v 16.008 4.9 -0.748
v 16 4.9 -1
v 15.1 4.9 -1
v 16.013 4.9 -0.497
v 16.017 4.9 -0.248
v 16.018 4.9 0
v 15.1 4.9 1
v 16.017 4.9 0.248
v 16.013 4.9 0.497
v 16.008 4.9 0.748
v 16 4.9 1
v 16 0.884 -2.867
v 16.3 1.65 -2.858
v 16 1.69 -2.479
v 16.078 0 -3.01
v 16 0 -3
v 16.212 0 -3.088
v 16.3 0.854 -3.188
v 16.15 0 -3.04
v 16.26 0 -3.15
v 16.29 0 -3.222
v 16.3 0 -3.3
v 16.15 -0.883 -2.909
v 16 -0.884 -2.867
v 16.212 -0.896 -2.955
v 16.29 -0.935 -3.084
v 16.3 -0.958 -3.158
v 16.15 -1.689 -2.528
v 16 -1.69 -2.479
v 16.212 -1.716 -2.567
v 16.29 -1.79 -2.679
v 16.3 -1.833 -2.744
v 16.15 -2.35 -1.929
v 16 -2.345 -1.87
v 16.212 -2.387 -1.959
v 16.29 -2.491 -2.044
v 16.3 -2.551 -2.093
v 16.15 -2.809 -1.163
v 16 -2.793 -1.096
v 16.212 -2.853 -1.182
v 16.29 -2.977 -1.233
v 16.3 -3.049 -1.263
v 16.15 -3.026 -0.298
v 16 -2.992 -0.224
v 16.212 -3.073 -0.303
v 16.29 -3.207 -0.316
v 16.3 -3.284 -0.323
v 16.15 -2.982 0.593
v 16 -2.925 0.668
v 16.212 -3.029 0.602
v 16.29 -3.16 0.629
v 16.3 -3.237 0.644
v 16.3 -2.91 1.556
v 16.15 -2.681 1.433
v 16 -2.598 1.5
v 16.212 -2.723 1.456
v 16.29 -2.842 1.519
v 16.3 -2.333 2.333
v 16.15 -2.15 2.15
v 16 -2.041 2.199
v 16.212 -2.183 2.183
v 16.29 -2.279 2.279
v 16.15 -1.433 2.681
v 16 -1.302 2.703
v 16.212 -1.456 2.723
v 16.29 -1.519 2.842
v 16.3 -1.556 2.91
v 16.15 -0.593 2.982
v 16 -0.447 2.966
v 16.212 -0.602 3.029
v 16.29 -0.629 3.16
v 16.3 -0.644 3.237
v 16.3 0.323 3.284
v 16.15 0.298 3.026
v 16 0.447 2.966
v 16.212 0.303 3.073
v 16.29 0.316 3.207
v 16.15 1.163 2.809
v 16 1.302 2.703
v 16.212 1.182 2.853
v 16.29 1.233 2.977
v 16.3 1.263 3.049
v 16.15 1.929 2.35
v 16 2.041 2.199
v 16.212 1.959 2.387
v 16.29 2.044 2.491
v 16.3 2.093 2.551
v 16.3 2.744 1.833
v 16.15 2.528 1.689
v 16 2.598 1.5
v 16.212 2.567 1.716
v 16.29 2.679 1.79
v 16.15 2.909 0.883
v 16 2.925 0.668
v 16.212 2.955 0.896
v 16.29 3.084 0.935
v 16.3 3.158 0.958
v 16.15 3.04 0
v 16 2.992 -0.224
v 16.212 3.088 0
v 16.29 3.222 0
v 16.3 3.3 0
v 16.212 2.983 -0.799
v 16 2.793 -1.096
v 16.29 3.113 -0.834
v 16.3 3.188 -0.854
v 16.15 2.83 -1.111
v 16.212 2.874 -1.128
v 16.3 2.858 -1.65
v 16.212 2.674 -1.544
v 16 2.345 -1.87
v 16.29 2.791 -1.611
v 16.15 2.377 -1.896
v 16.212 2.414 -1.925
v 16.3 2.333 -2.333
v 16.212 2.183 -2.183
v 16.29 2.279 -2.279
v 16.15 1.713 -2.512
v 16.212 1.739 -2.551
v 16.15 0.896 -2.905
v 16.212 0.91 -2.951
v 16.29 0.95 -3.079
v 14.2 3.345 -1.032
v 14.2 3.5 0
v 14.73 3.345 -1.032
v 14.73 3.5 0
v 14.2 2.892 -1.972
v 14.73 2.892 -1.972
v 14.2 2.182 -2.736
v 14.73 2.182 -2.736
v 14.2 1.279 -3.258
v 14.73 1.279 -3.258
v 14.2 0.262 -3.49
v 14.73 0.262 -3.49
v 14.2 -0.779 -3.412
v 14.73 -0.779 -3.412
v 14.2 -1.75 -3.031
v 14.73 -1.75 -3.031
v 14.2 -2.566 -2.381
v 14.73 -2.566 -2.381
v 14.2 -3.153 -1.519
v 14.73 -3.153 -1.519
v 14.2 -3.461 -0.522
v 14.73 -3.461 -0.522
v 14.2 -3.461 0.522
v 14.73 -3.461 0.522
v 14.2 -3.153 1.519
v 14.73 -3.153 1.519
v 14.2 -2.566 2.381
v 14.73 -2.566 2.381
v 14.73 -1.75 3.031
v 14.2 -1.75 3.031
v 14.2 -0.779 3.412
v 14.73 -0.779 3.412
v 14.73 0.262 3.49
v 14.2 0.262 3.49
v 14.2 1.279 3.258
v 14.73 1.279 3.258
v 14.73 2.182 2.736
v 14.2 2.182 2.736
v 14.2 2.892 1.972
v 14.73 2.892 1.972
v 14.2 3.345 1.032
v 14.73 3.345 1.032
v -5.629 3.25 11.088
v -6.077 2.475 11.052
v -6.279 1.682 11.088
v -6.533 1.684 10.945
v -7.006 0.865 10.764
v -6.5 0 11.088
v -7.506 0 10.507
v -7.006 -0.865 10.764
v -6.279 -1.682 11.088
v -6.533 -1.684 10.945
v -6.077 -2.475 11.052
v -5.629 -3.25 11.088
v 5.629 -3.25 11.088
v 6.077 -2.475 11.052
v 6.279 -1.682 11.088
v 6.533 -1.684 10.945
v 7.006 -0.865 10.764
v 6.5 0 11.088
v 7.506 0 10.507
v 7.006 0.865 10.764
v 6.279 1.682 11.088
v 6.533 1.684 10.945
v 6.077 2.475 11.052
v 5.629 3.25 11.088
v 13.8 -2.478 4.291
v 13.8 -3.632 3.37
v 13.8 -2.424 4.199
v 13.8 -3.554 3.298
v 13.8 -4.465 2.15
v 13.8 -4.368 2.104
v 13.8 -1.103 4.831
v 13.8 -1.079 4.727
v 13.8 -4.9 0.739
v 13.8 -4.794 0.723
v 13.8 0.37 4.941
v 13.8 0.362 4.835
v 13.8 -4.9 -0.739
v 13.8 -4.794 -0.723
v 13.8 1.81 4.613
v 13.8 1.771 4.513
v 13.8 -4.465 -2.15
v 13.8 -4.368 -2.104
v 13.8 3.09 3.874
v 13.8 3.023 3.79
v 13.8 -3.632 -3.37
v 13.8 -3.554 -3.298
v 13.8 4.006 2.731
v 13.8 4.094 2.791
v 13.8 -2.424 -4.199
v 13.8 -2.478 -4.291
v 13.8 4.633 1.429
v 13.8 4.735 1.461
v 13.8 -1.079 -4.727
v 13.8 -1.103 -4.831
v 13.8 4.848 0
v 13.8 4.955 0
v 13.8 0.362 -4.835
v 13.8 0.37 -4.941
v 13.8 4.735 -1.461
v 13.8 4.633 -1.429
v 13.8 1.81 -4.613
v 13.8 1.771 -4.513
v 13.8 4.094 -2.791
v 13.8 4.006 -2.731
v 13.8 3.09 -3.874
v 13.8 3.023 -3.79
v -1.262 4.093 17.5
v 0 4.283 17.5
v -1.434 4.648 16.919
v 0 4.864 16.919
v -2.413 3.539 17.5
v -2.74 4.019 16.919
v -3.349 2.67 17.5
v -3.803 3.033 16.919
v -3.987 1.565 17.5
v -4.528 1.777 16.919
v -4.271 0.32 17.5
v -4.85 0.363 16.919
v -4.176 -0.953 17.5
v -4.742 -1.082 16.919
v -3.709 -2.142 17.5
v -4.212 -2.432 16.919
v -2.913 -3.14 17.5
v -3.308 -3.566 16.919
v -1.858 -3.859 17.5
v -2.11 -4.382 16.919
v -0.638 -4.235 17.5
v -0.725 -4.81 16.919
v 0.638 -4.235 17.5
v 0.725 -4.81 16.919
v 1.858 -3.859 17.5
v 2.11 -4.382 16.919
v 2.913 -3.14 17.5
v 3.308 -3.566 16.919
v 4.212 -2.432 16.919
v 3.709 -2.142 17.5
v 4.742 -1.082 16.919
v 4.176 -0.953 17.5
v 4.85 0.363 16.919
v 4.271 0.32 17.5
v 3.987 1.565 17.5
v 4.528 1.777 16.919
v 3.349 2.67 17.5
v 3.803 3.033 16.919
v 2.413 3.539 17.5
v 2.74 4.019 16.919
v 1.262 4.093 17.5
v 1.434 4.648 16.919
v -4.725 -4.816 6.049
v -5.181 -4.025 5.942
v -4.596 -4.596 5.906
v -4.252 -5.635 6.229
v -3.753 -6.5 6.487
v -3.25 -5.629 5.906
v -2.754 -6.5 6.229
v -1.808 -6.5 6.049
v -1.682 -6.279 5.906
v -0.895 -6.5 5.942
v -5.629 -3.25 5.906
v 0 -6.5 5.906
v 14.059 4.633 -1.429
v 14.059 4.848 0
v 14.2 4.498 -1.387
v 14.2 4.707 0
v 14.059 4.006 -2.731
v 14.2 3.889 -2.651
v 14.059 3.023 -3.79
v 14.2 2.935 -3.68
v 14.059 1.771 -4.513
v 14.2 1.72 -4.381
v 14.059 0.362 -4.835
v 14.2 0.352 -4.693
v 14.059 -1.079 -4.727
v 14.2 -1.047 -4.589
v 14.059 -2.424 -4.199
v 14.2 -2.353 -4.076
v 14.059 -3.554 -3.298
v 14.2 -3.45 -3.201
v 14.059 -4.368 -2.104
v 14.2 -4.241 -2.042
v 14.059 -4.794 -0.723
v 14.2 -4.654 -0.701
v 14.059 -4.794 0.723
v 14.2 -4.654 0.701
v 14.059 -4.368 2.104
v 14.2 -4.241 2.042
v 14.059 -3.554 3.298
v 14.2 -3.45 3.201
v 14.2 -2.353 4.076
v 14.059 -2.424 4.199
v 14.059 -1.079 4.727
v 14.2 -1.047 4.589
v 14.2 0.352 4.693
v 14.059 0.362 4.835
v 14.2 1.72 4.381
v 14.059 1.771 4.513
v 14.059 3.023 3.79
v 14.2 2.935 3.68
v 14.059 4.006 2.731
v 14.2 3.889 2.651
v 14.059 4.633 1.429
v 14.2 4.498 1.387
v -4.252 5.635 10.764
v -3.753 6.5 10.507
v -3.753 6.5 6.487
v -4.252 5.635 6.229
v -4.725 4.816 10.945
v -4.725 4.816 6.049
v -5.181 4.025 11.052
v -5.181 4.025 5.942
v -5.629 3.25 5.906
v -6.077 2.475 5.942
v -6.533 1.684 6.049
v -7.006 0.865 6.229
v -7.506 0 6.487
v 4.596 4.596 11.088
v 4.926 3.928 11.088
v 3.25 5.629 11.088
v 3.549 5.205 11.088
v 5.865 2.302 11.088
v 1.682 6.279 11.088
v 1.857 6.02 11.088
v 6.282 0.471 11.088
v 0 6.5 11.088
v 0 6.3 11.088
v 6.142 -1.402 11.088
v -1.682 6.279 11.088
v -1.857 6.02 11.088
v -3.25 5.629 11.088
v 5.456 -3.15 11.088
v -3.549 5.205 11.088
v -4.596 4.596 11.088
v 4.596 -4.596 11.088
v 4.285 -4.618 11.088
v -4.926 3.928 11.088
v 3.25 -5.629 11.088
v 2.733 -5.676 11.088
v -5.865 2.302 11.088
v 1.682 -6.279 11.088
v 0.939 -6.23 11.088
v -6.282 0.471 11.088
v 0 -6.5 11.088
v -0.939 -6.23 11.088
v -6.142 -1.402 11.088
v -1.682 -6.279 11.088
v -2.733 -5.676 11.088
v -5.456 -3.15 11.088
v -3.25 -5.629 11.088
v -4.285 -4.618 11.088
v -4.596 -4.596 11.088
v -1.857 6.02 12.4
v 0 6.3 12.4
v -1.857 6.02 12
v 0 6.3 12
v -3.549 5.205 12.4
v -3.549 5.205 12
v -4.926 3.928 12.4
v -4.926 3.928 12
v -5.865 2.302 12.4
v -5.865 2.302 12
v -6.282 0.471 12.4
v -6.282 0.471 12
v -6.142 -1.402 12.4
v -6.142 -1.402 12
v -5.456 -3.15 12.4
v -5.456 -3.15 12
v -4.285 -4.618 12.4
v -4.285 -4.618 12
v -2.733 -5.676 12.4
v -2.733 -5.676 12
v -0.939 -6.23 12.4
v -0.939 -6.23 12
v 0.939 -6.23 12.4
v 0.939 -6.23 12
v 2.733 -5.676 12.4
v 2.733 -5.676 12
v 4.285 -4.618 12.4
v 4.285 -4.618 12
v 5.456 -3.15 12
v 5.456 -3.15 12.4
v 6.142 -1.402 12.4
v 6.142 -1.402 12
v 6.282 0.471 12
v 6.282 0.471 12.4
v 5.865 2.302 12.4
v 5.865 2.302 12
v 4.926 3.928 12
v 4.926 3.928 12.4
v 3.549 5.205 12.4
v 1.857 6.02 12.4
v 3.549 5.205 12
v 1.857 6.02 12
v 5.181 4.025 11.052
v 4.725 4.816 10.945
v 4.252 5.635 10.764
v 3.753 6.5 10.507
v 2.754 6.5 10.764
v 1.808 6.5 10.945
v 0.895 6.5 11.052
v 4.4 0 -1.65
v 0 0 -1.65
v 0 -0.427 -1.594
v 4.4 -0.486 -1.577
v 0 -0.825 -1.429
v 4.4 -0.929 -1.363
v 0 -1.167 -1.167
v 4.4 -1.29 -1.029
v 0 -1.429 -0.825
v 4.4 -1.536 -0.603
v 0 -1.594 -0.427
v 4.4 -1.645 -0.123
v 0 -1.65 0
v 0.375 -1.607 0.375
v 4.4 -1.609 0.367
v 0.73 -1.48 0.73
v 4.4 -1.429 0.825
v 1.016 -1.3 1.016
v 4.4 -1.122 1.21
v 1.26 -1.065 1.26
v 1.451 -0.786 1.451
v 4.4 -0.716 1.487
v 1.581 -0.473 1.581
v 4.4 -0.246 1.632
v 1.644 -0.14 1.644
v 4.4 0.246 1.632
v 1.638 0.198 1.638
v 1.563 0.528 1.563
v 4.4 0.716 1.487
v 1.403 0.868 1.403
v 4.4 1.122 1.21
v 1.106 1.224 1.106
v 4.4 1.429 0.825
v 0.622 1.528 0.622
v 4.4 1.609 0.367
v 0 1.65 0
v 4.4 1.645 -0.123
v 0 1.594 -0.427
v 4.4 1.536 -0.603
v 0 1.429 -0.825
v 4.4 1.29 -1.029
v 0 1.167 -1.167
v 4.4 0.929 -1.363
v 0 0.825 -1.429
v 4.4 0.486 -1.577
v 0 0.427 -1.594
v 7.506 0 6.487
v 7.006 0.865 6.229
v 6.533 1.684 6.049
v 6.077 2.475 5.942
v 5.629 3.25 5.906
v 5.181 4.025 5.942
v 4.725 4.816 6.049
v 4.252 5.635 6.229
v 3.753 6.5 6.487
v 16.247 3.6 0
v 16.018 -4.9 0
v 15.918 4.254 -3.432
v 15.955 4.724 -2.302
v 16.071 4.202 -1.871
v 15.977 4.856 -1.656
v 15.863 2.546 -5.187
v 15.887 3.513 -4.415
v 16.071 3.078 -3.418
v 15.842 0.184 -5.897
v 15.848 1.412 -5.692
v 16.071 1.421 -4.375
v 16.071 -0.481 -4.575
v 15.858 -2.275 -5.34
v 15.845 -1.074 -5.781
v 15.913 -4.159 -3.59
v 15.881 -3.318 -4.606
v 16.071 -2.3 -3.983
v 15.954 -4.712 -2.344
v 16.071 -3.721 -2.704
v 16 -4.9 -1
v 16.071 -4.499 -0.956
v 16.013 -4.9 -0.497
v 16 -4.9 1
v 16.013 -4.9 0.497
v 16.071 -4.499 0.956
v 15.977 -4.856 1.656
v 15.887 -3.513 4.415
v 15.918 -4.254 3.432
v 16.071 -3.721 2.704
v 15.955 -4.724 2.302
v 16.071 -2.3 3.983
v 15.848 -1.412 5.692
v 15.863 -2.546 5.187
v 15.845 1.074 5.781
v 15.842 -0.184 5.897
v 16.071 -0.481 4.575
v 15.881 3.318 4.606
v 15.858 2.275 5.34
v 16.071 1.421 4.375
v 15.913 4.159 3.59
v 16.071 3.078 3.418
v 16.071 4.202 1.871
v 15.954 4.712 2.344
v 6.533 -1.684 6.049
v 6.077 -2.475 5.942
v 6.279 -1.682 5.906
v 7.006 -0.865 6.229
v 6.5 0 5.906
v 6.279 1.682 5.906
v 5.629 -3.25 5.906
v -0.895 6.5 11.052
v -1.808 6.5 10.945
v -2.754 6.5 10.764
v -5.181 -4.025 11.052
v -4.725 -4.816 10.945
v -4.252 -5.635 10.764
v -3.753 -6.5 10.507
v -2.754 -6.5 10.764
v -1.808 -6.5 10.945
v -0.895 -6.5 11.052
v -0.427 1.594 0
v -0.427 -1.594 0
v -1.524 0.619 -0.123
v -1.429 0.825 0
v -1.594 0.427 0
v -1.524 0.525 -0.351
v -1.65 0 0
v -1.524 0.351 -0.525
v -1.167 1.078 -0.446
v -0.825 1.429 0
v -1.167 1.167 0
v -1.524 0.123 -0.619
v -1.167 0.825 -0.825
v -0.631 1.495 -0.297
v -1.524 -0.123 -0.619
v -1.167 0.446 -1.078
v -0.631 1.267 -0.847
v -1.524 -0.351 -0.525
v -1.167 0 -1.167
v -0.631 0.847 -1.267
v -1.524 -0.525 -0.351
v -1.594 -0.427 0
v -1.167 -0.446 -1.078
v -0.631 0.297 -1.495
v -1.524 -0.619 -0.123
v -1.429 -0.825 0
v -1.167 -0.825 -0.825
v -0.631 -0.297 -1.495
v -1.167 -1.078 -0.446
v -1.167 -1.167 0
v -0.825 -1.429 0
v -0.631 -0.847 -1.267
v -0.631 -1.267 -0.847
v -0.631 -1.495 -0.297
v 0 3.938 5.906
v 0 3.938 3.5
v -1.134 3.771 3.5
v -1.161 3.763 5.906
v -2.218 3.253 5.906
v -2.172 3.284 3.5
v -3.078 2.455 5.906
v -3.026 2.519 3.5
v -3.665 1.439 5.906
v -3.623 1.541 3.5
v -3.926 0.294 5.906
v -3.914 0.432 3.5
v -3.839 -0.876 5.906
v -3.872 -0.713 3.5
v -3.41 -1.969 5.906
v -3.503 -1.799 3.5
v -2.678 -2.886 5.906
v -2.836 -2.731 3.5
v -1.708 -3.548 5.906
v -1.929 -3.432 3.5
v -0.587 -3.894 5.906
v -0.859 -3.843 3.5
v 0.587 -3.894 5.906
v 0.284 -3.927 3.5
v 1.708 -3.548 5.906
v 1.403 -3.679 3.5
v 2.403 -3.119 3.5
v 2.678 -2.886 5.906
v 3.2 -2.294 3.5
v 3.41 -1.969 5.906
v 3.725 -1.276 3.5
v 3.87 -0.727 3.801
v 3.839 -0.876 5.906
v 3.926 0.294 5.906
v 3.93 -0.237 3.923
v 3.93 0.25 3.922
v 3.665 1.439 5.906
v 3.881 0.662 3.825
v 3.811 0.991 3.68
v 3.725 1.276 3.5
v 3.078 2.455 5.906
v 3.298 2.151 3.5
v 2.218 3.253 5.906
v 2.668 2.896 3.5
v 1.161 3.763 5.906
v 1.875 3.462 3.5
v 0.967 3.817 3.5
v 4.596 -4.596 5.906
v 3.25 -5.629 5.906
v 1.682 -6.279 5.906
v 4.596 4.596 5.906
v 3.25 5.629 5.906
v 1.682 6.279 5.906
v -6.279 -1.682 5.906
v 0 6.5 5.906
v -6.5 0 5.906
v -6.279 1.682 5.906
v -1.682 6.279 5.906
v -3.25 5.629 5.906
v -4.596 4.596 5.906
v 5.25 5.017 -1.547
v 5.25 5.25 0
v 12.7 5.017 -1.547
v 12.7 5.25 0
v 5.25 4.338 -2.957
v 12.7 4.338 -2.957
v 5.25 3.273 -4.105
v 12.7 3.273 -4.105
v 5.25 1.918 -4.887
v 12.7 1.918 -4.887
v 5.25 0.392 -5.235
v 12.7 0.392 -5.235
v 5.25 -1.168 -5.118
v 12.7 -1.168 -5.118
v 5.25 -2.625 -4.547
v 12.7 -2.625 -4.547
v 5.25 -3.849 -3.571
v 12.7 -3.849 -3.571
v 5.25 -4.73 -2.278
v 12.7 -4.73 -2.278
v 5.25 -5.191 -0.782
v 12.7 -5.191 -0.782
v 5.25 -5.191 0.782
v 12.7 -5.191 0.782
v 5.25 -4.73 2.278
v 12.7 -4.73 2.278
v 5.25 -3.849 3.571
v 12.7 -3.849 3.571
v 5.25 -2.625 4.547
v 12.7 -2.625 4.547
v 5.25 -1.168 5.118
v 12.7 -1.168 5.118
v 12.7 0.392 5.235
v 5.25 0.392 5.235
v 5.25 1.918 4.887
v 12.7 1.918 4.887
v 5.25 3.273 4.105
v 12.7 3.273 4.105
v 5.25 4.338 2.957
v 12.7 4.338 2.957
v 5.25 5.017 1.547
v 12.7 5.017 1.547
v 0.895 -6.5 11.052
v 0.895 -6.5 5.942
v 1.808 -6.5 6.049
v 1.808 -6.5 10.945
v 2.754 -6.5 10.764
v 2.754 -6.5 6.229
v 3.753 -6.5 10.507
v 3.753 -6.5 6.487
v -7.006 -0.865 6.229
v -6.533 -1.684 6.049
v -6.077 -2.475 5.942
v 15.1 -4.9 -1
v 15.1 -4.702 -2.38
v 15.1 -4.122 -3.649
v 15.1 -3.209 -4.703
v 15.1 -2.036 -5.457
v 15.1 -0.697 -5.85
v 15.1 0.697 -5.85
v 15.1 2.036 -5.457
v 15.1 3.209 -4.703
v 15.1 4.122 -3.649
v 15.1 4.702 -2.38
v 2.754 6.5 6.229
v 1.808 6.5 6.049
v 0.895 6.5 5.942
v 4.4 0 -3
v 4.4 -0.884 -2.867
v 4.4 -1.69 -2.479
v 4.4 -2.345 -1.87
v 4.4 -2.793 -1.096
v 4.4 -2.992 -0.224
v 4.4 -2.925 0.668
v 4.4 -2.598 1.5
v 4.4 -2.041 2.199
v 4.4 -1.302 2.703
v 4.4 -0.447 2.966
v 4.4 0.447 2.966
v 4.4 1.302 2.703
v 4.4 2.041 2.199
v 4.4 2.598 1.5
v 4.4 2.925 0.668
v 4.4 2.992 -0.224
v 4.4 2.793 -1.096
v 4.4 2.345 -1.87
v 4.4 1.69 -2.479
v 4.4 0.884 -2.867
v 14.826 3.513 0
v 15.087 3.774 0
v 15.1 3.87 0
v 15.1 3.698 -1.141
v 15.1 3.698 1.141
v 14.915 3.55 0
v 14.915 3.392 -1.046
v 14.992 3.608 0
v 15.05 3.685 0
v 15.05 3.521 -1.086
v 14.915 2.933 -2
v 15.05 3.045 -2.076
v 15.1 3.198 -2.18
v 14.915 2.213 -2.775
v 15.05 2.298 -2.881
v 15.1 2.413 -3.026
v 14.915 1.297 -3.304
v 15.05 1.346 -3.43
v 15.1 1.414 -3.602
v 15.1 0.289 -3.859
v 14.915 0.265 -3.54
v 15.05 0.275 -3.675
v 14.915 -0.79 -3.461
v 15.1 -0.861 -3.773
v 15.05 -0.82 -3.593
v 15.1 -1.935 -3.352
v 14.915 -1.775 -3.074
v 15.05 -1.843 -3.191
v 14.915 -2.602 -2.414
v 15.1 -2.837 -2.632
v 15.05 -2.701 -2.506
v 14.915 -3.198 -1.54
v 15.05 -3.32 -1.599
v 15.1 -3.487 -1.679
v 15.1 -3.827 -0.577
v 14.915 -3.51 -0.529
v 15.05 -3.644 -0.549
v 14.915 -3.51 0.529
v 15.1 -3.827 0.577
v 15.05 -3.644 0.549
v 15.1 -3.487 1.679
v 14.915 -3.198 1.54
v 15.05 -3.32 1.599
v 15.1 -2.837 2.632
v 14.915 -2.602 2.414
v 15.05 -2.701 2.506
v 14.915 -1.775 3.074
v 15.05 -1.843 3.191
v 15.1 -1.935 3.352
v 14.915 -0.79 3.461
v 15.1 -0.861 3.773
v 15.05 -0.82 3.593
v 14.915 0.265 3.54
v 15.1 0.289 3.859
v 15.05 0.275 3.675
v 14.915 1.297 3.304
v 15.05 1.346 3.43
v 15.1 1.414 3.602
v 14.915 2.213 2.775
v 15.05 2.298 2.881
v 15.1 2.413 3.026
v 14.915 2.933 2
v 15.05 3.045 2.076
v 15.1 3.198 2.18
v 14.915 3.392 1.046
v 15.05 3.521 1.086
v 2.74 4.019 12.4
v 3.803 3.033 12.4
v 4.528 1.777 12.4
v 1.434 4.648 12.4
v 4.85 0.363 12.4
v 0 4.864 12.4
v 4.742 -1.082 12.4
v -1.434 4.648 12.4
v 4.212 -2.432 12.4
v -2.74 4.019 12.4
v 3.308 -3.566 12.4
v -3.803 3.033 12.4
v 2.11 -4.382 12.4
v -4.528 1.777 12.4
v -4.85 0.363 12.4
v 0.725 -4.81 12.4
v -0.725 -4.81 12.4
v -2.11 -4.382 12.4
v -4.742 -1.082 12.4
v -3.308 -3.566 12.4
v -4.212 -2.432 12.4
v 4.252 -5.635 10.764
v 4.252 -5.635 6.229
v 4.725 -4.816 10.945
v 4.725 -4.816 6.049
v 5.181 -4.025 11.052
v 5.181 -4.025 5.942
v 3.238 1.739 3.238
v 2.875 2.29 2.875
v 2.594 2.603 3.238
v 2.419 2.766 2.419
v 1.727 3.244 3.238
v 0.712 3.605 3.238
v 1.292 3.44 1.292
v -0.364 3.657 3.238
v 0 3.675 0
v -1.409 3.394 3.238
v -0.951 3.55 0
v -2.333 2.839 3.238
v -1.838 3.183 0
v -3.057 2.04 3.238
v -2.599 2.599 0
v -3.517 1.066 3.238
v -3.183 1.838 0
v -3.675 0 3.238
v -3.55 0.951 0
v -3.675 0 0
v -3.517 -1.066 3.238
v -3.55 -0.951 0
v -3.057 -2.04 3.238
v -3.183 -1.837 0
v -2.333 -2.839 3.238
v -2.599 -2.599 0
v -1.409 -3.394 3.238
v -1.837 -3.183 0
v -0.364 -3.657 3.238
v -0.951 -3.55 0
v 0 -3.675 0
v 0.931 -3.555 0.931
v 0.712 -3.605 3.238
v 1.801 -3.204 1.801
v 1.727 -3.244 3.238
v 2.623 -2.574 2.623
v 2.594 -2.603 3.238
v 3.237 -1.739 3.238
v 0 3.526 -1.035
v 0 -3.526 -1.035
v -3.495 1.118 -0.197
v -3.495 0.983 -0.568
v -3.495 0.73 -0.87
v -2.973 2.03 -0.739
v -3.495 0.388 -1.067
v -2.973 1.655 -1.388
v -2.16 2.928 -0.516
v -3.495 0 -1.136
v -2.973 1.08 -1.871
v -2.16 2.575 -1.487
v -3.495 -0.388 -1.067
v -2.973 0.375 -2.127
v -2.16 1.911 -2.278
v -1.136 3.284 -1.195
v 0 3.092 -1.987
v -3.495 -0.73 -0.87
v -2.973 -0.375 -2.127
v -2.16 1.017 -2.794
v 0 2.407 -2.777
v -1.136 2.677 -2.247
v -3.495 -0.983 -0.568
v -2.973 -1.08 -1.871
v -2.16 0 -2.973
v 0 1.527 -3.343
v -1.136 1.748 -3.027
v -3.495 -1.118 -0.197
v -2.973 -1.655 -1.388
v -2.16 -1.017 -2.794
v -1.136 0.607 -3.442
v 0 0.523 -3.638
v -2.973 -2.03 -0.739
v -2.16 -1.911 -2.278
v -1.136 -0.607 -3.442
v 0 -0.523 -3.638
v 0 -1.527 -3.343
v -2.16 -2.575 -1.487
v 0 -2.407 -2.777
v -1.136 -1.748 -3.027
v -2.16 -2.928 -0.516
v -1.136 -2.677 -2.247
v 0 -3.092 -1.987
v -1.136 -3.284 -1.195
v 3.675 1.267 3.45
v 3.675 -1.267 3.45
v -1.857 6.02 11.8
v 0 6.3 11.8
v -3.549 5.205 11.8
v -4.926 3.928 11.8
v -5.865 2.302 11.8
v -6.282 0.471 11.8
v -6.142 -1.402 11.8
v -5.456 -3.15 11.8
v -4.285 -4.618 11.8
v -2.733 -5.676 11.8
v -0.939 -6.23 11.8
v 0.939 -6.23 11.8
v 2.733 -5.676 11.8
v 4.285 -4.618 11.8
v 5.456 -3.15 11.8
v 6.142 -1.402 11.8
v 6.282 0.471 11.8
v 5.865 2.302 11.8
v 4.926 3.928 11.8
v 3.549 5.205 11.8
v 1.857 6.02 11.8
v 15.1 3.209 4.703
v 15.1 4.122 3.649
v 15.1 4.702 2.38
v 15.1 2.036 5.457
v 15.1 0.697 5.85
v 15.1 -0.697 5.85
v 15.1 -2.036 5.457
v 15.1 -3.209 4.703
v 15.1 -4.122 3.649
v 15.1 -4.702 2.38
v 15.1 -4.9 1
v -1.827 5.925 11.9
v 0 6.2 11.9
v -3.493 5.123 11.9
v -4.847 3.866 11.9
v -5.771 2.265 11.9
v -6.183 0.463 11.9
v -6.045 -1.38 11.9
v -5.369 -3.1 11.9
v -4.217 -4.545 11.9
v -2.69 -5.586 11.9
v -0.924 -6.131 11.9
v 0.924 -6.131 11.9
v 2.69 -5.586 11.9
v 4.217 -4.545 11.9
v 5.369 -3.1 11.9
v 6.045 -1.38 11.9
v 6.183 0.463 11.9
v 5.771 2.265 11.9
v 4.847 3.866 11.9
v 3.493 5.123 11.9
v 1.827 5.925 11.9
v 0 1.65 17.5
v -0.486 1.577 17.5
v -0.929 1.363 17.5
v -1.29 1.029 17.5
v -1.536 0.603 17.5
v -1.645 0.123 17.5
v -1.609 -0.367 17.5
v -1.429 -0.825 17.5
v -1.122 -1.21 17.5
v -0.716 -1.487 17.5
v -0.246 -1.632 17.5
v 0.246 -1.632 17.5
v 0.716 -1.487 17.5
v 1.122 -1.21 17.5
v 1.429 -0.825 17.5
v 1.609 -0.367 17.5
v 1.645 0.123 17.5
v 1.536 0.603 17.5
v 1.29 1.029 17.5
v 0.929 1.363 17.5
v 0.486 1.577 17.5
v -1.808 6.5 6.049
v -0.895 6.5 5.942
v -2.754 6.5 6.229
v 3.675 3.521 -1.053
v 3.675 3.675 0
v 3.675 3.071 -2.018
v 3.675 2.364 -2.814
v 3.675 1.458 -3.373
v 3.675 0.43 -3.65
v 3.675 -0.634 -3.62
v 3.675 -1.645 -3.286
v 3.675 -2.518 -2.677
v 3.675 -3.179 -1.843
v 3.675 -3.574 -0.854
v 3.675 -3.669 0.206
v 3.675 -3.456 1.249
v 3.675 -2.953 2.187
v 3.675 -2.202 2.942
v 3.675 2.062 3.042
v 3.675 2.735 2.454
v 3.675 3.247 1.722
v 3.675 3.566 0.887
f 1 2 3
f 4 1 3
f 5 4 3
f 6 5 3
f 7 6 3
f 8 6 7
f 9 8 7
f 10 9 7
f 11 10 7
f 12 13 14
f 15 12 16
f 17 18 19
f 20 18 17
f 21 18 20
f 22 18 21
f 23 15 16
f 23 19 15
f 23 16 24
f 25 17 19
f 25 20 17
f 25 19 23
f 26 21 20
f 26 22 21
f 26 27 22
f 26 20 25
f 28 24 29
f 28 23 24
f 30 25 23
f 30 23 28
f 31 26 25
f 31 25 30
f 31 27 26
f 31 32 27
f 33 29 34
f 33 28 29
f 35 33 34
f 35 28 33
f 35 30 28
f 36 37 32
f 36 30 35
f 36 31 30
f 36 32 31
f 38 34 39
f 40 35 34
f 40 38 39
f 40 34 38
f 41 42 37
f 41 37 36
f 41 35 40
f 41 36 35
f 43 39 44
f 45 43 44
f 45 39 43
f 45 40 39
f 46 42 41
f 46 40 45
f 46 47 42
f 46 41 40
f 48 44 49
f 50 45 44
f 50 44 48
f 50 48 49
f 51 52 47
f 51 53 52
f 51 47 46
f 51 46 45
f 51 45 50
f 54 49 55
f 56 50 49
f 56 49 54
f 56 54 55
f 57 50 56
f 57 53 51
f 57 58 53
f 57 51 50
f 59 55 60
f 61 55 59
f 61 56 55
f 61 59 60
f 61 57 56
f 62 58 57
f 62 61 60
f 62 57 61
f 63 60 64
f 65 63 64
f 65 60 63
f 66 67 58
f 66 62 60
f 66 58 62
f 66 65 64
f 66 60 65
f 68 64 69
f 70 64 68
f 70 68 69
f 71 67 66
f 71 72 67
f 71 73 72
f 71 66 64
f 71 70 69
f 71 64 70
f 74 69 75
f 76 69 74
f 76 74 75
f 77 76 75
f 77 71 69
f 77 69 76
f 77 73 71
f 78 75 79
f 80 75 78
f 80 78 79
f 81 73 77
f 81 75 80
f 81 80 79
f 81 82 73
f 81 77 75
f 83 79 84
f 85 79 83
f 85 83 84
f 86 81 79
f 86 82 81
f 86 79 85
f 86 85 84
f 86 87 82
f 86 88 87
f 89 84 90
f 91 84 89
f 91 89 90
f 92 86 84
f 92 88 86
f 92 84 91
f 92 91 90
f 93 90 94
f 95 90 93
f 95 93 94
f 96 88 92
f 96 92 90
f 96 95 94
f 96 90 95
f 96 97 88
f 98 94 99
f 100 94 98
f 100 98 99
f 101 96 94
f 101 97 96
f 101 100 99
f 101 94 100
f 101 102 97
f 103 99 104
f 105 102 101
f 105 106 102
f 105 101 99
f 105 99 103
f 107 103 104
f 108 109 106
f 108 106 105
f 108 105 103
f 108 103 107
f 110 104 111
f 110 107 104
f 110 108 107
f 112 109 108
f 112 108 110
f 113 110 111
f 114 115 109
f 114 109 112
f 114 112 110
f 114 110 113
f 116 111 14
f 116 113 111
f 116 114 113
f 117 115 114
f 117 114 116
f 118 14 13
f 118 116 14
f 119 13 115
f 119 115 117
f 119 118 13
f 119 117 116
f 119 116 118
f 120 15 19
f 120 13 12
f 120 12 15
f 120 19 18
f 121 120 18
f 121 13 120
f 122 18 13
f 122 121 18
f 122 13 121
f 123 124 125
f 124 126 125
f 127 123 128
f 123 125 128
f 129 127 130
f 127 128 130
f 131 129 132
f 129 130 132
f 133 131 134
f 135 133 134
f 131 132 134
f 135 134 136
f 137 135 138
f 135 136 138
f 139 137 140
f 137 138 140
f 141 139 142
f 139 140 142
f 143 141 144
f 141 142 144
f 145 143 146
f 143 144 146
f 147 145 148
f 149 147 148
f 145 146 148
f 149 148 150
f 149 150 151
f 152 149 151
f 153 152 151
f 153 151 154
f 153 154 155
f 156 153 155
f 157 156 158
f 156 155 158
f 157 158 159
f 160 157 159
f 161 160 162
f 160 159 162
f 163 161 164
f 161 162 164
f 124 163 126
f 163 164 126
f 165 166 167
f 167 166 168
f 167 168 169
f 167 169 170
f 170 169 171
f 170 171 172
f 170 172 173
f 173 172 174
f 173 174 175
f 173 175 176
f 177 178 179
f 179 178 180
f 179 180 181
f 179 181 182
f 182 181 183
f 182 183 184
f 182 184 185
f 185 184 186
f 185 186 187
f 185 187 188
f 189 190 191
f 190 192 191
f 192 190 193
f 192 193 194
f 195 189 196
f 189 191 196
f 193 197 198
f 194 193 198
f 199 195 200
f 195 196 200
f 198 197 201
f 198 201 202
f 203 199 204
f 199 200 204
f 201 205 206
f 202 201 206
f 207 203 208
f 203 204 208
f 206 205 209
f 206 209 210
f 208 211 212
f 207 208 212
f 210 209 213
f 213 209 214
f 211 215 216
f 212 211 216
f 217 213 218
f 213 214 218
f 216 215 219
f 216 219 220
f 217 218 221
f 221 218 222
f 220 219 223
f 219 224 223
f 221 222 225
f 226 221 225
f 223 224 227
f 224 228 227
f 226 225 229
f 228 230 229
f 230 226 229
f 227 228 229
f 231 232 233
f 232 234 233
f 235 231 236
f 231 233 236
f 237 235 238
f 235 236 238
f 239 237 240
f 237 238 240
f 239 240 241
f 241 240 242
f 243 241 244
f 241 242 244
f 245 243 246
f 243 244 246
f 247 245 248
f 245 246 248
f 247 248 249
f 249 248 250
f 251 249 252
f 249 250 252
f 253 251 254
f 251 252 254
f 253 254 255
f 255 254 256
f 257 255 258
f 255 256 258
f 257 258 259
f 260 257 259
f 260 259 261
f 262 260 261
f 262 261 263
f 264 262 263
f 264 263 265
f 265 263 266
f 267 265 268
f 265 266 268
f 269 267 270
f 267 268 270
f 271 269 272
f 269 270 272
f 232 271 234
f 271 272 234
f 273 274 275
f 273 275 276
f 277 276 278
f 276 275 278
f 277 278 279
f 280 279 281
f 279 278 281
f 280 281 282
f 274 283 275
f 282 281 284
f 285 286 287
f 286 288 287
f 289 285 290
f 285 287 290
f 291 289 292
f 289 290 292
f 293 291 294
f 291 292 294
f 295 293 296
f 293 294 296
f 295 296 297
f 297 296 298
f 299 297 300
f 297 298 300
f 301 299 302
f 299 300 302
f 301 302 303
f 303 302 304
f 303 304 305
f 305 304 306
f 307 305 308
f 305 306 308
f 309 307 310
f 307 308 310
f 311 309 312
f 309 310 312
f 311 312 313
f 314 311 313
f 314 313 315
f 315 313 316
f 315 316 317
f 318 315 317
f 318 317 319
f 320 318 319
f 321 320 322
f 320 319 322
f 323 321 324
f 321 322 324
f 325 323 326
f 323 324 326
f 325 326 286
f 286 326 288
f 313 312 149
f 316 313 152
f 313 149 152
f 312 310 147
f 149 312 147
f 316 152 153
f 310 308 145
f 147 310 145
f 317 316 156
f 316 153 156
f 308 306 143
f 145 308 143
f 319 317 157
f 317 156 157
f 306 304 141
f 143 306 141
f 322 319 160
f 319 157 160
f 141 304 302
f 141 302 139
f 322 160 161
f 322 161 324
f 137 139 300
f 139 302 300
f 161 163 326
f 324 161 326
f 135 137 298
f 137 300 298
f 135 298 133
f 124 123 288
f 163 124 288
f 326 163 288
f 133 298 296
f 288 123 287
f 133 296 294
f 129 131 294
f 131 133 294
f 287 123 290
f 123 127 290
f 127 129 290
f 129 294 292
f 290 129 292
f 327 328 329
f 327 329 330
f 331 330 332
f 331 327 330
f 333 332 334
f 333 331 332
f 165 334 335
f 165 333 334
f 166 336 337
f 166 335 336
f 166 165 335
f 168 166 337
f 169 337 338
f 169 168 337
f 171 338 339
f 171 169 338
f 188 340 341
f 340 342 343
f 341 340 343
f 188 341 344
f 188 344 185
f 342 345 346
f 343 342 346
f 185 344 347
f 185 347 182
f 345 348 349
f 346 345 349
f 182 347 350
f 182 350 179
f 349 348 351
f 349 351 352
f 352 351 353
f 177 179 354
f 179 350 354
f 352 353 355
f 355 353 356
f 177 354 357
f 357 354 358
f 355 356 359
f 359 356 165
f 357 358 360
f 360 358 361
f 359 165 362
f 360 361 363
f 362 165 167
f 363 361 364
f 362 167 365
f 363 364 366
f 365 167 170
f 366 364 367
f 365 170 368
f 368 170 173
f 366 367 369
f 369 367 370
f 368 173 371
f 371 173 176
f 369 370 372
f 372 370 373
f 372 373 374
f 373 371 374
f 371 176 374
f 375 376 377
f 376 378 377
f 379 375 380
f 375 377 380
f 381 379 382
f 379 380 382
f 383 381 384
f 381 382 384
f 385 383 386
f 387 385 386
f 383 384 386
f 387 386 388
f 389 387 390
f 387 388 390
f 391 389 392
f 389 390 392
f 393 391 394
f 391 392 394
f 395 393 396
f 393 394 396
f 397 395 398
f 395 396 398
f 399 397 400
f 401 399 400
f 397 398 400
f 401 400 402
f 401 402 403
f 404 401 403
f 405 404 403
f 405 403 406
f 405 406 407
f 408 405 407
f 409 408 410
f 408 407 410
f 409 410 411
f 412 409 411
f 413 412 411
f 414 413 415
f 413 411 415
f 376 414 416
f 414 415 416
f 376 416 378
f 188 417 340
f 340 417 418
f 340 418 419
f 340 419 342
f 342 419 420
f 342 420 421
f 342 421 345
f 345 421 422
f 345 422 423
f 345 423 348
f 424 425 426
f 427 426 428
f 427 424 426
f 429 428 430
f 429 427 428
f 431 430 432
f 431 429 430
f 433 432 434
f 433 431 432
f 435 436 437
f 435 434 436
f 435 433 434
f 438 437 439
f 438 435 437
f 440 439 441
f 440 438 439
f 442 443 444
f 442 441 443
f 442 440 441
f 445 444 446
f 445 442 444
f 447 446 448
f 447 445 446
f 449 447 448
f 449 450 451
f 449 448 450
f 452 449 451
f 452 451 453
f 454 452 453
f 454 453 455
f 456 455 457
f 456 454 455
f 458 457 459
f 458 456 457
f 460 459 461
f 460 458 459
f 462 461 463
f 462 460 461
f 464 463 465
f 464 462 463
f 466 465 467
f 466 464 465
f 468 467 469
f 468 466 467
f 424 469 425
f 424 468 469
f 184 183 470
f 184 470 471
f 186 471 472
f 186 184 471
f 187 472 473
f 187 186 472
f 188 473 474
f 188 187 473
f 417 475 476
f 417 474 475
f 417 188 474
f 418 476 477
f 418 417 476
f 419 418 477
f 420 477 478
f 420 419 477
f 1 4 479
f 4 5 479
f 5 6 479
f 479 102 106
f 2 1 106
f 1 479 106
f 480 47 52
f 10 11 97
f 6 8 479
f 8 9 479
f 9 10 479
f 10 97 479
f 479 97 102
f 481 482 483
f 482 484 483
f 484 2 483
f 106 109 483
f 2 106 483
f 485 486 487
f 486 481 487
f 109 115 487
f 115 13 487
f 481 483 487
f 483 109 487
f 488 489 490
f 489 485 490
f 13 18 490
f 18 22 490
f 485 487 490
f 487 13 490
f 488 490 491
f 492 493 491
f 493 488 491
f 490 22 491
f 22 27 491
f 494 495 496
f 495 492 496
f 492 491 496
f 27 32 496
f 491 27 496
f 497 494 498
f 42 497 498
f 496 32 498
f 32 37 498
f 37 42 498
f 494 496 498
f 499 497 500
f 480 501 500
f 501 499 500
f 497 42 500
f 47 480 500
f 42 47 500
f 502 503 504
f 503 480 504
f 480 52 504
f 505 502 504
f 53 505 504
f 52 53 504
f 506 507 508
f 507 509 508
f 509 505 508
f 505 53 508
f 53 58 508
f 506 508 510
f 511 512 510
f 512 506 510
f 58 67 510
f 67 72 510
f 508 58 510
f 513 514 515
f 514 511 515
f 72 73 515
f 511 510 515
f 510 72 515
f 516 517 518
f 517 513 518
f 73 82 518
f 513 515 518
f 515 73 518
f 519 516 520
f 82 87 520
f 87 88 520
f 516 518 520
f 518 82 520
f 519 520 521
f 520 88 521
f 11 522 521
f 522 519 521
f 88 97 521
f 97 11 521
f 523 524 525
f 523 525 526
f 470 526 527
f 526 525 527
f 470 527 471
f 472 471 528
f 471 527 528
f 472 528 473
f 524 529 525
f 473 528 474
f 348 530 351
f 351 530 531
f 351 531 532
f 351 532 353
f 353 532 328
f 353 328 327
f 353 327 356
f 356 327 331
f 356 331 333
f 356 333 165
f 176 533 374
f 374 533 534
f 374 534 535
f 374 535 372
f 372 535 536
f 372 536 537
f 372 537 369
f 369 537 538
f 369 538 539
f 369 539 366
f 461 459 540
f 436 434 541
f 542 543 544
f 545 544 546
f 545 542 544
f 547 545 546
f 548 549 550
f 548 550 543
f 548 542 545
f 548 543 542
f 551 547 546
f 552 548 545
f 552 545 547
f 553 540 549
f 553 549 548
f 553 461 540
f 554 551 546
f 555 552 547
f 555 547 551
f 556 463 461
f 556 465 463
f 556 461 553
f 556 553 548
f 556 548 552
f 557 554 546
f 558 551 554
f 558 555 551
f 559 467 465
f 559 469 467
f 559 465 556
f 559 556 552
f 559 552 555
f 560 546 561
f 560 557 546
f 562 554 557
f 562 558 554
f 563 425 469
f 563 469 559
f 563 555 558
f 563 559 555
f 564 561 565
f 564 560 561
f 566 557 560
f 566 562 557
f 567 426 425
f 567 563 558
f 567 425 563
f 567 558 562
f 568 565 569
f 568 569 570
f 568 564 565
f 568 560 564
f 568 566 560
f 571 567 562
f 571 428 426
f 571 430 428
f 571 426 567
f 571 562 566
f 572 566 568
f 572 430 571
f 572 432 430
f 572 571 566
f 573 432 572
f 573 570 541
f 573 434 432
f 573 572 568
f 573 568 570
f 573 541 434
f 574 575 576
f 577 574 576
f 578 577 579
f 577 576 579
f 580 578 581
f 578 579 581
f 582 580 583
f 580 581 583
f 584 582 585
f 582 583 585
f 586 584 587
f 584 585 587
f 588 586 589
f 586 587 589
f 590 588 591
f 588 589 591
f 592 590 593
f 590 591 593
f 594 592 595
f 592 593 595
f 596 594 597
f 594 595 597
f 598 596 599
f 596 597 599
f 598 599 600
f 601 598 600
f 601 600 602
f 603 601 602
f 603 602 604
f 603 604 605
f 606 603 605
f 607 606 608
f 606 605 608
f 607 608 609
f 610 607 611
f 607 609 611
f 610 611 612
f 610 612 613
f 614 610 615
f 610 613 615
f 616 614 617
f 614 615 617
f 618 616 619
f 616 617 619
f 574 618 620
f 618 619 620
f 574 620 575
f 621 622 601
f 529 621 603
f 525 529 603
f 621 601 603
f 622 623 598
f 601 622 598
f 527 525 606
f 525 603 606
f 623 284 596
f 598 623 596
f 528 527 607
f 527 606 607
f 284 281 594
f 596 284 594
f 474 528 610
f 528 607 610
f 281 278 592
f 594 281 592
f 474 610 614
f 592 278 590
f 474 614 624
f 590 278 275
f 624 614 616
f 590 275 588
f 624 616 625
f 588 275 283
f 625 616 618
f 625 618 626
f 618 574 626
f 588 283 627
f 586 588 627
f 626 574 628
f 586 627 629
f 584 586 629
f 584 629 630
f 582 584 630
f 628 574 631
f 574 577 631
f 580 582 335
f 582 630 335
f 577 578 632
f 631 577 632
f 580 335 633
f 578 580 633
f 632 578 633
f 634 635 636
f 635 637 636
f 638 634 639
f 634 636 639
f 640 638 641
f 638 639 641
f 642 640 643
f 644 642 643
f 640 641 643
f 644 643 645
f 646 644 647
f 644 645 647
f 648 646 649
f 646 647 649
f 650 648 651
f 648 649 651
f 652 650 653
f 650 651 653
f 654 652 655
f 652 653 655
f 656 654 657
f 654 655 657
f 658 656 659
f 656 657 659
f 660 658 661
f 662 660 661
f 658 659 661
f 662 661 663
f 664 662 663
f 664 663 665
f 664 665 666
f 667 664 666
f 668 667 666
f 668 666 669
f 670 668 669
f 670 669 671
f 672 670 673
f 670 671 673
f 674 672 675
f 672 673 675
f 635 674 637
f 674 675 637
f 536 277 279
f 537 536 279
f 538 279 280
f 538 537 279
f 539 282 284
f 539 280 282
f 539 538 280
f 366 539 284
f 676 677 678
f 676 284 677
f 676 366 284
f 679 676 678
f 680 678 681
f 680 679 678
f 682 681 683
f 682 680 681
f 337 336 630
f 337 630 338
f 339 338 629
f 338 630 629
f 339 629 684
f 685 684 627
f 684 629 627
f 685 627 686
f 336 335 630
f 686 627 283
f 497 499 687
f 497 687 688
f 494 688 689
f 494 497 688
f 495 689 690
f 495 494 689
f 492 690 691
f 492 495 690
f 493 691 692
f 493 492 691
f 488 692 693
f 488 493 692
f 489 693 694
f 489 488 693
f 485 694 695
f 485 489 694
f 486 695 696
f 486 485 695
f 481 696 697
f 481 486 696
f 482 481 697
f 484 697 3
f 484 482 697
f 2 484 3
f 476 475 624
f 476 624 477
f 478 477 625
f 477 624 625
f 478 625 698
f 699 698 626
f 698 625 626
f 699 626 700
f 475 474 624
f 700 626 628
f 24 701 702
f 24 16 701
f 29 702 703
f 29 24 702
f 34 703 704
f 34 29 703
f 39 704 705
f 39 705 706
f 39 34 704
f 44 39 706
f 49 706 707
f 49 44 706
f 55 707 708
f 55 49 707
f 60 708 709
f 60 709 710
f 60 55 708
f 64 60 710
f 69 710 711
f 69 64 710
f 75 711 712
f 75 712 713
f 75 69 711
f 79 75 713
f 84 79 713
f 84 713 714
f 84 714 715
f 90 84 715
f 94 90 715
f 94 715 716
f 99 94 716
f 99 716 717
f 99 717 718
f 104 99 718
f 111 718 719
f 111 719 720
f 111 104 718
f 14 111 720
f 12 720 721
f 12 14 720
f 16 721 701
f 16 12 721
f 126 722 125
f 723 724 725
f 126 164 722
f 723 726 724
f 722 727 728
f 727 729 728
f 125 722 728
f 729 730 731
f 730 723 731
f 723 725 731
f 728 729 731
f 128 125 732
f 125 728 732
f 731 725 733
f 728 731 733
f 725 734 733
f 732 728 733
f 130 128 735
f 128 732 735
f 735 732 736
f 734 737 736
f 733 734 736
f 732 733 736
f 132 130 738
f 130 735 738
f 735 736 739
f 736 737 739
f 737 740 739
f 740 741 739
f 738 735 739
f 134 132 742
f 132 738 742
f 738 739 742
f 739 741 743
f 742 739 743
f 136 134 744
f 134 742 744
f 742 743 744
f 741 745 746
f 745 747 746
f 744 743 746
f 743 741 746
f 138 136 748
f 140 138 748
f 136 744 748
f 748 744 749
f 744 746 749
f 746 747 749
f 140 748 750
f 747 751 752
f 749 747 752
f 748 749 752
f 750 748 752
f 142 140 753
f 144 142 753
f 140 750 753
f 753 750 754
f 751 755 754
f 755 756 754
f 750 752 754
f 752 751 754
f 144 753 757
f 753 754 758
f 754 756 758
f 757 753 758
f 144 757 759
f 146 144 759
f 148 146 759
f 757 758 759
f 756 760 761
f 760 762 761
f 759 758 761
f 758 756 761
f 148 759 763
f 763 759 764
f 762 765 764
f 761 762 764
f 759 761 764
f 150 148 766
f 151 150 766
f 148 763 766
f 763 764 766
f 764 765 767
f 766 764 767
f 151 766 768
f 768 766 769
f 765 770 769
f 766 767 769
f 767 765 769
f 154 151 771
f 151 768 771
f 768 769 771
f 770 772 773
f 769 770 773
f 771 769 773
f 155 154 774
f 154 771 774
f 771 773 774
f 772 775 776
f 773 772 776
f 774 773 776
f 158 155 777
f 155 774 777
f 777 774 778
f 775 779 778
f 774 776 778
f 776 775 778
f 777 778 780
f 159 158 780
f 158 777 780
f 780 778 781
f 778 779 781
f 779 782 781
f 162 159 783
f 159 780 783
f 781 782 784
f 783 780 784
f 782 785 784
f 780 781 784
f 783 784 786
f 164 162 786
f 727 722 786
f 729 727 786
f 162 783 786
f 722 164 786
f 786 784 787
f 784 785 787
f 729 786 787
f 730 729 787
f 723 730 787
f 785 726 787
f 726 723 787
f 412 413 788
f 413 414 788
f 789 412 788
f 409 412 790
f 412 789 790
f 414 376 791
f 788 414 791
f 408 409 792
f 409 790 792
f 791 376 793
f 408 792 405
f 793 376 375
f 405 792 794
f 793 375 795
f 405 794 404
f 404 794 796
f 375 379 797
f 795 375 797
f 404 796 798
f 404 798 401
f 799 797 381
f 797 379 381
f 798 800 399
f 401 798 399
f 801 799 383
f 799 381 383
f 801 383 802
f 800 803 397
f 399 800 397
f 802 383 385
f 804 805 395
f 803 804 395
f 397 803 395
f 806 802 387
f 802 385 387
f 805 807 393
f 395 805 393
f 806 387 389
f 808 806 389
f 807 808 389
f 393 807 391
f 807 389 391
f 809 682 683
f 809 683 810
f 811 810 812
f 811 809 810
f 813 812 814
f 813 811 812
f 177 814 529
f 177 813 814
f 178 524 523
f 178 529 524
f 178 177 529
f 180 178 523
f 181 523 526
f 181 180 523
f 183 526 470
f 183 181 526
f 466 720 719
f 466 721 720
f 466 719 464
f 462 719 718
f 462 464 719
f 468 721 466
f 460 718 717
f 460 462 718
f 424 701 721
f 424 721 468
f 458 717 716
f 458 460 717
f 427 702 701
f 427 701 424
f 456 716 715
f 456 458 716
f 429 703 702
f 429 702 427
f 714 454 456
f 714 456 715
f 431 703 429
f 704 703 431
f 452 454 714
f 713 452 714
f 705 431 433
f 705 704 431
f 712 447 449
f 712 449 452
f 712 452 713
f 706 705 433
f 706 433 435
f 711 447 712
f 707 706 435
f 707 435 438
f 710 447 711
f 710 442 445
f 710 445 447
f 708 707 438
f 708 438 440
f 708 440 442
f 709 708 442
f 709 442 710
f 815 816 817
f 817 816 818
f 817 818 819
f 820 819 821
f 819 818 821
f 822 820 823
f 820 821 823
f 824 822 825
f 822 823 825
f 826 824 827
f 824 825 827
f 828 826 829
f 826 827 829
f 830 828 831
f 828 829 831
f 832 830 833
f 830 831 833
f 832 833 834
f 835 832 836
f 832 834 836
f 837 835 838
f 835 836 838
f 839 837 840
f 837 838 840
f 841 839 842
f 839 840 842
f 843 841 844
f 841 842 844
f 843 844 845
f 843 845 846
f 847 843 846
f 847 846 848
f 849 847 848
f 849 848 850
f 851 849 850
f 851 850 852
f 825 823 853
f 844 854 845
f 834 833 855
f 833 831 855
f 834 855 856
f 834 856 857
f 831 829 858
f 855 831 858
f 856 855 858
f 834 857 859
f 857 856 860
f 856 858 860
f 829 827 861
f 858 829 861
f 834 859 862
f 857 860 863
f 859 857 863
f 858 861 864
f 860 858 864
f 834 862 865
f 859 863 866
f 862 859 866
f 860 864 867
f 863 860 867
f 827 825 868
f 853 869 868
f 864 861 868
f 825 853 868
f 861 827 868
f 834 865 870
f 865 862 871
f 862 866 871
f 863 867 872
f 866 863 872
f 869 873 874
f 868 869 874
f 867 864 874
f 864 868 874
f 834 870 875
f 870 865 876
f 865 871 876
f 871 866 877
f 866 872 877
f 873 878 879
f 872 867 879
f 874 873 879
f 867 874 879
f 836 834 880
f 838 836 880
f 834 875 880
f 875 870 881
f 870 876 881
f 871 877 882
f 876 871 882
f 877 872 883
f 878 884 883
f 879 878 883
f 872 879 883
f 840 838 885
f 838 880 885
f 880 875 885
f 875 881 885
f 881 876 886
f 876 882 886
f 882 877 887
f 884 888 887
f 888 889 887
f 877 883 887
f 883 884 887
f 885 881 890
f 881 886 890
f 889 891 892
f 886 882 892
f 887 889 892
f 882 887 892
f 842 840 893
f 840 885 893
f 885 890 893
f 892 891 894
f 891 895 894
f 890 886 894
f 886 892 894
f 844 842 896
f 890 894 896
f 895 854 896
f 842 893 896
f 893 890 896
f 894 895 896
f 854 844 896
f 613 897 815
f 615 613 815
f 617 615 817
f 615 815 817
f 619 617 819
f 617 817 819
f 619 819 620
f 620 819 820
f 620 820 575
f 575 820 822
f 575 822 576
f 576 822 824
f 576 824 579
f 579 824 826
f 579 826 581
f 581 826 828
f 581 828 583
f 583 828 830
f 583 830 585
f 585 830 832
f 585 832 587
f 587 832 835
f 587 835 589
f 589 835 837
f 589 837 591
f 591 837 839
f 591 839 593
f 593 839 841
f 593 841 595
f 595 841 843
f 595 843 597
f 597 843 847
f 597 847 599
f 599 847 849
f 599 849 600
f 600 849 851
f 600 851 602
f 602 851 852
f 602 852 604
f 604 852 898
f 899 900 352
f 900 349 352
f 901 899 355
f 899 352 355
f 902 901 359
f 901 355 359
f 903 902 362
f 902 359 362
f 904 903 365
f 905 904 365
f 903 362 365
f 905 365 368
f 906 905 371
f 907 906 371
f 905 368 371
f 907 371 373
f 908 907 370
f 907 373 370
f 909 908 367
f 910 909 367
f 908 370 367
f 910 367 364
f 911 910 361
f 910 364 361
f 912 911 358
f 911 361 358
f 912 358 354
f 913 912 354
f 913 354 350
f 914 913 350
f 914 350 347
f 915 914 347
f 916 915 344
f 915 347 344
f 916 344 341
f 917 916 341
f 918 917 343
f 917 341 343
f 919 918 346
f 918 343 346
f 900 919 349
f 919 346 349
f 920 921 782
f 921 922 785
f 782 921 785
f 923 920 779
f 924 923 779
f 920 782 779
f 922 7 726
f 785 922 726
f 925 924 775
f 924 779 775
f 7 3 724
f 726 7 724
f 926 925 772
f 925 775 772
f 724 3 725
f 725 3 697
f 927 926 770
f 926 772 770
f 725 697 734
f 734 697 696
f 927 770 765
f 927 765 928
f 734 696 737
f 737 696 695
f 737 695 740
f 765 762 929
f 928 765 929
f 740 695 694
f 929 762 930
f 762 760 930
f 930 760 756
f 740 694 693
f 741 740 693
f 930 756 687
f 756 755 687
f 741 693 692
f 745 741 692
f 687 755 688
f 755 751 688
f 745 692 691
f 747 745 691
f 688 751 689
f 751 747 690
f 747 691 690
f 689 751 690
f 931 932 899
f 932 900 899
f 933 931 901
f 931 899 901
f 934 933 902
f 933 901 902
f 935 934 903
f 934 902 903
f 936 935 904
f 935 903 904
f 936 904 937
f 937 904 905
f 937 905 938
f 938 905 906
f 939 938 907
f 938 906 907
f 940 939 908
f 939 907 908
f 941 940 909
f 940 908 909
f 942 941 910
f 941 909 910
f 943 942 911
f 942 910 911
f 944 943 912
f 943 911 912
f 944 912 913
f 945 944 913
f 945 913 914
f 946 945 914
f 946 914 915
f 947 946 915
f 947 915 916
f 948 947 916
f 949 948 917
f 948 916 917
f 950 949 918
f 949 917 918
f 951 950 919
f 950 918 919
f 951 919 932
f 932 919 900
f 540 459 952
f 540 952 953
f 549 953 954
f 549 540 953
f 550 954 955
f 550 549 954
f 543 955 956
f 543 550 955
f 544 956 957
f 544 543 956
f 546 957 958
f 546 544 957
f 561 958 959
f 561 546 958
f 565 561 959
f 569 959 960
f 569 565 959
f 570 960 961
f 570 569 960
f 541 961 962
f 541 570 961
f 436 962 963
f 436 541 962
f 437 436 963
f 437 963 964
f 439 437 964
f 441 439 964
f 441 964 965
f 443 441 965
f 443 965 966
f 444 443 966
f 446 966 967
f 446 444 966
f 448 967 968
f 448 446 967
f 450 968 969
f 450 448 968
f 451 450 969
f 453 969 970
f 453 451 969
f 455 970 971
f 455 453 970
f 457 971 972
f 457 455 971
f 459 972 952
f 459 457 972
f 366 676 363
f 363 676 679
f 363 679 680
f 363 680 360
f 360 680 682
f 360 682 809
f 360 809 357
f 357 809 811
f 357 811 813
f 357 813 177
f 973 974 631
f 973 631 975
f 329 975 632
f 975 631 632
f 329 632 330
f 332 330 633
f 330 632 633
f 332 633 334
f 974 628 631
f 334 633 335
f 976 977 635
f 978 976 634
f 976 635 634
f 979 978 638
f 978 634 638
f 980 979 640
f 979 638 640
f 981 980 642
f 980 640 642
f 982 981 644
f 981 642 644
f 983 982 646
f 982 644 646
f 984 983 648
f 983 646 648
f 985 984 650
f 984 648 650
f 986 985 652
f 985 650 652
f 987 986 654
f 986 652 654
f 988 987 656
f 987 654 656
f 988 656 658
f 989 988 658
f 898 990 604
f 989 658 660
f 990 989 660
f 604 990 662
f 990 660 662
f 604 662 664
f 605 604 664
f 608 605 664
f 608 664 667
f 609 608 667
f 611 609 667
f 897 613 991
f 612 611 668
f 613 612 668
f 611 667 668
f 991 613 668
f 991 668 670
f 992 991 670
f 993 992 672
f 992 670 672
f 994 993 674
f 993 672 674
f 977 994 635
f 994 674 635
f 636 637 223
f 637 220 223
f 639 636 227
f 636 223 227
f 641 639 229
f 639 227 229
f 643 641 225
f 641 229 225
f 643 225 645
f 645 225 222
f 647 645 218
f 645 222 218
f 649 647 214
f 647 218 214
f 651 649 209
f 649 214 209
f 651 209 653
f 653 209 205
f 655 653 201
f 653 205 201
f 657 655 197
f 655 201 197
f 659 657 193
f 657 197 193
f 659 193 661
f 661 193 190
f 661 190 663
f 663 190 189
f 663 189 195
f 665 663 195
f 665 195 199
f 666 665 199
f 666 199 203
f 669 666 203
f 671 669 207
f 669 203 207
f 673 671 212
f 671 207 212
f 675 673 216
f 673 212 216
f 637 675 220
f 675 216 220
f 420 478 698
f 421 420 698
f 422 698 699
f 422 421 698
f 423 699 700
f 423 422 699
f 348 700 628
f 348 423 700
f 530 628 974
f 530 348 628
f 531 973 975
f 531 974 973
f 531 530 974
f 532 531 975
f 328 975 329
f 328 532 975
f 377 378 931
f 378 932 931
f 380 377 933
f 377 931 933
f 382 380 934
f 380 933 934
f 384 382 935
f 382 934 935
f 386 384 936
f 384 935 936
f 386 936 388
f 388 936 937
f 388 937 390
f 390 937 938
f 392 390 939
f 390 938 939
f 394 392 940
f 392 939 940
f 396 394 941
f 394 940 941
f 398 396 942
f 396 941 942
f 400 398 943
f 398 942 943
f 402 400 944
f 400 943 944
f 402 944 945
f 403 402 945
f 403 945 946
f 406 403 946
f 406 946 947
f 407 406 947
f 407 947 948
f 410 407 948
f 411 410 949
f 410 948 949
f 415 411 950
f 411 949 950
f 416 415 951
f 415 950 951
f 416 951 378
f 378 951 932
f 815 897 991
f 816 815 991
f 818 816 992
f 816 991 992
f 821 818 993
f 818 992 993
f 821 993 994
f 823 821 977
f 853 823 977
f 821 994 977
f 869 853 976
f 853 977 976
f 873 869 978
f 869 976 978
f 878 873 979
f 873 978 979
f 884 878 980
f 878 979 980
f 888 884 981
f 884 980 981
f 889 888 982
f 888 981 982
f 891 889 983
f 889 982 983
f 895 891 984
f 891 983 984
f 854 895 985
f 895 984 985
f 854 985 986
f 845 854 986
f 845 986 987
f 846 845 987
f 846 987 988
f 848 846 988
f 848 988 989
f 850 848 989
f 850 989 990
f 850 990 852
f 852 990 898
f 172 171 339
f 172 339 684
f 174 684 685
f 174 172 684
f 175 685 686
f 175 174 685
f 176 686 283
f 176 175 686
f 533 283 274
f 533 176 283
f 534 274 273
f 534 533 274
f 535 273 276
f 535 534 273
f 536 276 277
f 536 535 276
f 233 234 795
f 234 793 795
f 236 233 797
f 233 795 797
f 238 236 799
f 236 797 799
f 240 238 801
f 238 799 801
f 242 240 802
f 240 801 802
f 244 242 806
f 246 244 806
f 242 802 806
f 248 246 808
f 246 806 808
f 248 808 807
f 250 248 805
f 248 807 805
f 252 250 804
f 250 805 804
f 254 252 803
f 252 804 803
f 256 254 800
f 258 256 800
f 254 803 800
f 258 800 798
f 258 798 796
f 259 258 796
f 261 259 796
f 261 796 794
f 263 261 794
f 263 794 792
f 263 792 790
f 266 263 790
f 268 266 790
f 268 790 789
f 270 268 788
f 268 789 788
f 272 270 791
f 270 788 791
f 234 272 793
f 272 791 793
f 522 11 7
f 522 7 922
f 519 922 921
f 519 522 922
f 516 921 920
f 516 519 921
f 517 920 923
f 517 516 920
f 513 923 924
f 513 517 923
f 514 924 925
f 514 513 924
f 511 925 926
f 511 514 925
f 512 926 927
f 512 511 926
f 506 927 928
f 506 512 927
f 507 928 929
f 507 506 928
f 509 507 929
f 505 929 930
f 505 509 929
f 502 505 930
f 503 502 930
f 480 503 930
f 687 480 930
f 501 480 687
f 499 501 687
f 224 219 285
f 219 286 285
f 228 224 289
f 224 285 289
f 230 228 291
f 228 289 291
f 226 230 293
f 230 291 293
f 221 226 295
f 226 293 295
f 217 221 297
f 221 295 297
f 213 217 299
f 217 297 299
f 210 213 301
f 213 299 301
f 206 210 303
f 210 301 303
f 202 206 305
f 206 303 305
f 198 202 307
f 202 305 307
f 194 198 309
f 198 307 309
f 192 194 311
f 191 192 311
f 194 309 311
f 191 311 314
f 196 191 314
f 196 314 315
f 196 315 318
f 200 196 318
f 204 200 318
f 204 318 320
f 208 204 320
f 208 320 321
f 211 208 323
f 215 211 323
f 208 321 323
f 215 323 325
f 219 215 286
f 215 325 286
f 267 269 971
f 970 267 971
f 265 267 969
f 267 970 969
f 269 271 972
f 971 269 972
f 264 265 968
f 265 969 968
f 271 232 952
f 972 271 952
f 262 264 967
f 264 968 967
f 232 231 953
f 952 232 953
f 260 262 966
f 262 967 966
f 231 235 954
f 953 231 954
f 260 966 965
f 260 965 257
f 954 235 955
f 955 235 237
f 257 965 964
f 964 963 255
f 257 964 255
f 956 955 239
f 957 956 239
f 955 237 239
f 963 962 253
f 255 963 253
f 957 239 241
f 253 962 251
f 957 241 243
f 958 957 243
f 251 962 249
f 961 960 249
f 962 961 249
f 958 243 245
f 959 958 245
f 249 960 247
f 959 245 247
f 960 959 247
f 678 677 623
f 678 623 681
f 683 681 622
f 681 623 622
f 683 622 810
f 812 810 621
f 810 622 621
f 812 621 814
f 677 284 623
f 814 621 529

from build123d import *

# Parameters (mm, degrees)
CUT_EXTRUDE1_DEPTH = 1.2
SKETCH6_W          = 17.5
SKETCH6_H          = 1.65
SKETCH7_W          = 26
SKETCH7_H          = 26
CUT_EXTRUDE2_DEPTH = 6.566666667


with BuildPart() as part:
    # Sketch1 → Revolve1 (revolve)
    with BuildSketch(Plane.XY):
        with BuildLine():
            Line((0, 3.675), (3.675, 3.675))
            Line((3.675, 3.675), (5.25, 5.25))
            Line((5.25, 5.25), (12.7, 5.25))
            Line((12.7, 5.25), (13.8, 4.955255888))
            Line((13.8, 4.955255888), (13.8, 4.848076211))
            Line((13.8, 4.848076211), (14.058578644, 4.848076211))
            Line((14.058578644, 4.848076211), (14.2, 4.706654855))
            Line((14.2, 4.706654855), (14.2, 3.5))
            Line((14.2, 3.5), (14.73, 3.5))
            ThreePointArc((14.73, 3.5), (14.991629509, 3.608370491), (15.1, 3.87))
            Line((15.1, 3.87), (15.1, 6.9))
            Line((15.1, 6.9), (15.497402943, 6.9))
            ThreePointArc((15.497402943, 6.9), (15.625960465, 6.853208889), (15.694364494, 6.734729636))
            Line((15.694364494, 6.734729636), (16.3, 3.3))
            Line((16.3, 3.3), (16.3, 0))
            Line((16.3, 0), (-3.675, 0))
            ThreePointArc((-3.675, 0), (-2.598617421, 2.598617421), (0, 3.675))
        make_face()
    revolve(axis=Axis((16.3, 0, 0), (-1, 0, 0)))

    # Sketch2 → Revolve2 (revolve)
    with BuildSketch(Plane(origin=(0, 0, 0), x_dir=(0, 0, -1), z_dir=(1, 0, 0))):
        Polygon((-12.4, 0), (-12.4, 6.3), (-12, 6.3), (-11.9, 6.2), (-11.8, 6.3), (-11.0875, 6.3), (-11.0875, 6.5), (-10.48705572, 7.54), (-6.50669428, 7.54), (-5.90625, 6.5), (-5.90625, 3.9375), (-3.5, 3.9375), (-3.2375, 3.675), (0, 3.675), (0, 0), align=None)
    revolve(axis=Axis((0, 0, 0), (0, 0, 1)))

    # Sketch3 → Revolve3 (revolve)
    with BuildSketch(Plane(origin=(0, 0, 0), x_dir=(0, 0, -1), z_dir=(1, 0, 0))):
        Polygon((-17.5, 0), (-17.5, 4.283), (-16.919, 4.864), (-12.4, 4.864), (-12.4, 0), align=None)
    revolve(axis=Axis((0, 0, 12.4), (0, 0, 1)))

    # Sketch4 → Cut-Extrude1 (cut)
    with BuildSketch(Plane(origin=(16.3, 0, 0), x_dir=(0, 0, -1), z_dir=(1, 0, 0))):
        Polygon((-11.8, -6.812733176), (0, -13.625466353), (11.8, -6.812733176), (11.8, 6.812733176), (0, 13.625466353), (-11.8, 6.812733176), align=None)
        with BuildLine():
            Line((-1, -4.9), (1, -4.9))
            ThreePointArc((1, -4.9), (5.9, 0), (1, 4.9))
            Line((1, 4.9), (-1, 4.9))
            ThreePointArc((-1, 4.9), (-5.9, 0), (-1, -4.9))
        make_face(mode=Mode.SUBTRACT)
    extrude(amount=-CUT_EXTRUDE1_DEPTH, mode=Mode.SUBTRACT)

    # Sketch6 → Cut-Revolve1 (revolve, cut)
    with BuildSketch(Plane(origin=(0, 0, 0), x_dir=(0, 0, -1), z_dir=(1, 0, 0))):
        with Locations((-8.75, 0.825)):
            Rectangle(SKETCH6_W, SKETCH6_H)
    revolve(axis=Axis((0, 0, 0), (0, 0, 1)), mode=Mode.SUBTRACT)

    # Sketch5 → Cut-Revolve2 (revolve, cut)
    with BuildSketch(Plane(origin=(0, 0, 0), x_dir=(1, 0, 0), z_dir=(0, 1, 0))):
        with BuildLine():
            Line((0, 1.65), (4.4, 1.65))
            Line((4.4, 1.65), (4.4, 3))
            Line((4.4, 3), (16, 3))
            ThreePointArc((16, 3), (16.212132034, 3.087867966), (16.3, 3.3))
            Line((16.3, 3.3), (16.3, 0))
            Line((16.3, 0), (-1.65, 0))
            ThreePointArc((-1.65, 0), (-1.166726189, 1.166726189), (0, 1.65))
        make_face()
    revolve(axis=Axis((16.3, 0, 0), (-1, 0, 0)), mode=Mode.SUBTRACT)

    # Sketch7 → Cut-Extrude2 (cut)
    with BuildSketch(Plane.XY.offset(12.4)):
        Rectangle(SKETCH7_W, SKETCH7_H)
        Polygon((-7.505553499, 0), (-3.75277675, -6.5), (3.75277675, -6.5), (7.505553499, 0), (3.75277675, 6.5), (-3.75277675, 6.5), align=None, mode=Mode.SUBTRACT)
    extrude(amount=-CUT_EXTRUDE2_DEPTH, mode=Mode.SUBTRACT)


solid = part.part
